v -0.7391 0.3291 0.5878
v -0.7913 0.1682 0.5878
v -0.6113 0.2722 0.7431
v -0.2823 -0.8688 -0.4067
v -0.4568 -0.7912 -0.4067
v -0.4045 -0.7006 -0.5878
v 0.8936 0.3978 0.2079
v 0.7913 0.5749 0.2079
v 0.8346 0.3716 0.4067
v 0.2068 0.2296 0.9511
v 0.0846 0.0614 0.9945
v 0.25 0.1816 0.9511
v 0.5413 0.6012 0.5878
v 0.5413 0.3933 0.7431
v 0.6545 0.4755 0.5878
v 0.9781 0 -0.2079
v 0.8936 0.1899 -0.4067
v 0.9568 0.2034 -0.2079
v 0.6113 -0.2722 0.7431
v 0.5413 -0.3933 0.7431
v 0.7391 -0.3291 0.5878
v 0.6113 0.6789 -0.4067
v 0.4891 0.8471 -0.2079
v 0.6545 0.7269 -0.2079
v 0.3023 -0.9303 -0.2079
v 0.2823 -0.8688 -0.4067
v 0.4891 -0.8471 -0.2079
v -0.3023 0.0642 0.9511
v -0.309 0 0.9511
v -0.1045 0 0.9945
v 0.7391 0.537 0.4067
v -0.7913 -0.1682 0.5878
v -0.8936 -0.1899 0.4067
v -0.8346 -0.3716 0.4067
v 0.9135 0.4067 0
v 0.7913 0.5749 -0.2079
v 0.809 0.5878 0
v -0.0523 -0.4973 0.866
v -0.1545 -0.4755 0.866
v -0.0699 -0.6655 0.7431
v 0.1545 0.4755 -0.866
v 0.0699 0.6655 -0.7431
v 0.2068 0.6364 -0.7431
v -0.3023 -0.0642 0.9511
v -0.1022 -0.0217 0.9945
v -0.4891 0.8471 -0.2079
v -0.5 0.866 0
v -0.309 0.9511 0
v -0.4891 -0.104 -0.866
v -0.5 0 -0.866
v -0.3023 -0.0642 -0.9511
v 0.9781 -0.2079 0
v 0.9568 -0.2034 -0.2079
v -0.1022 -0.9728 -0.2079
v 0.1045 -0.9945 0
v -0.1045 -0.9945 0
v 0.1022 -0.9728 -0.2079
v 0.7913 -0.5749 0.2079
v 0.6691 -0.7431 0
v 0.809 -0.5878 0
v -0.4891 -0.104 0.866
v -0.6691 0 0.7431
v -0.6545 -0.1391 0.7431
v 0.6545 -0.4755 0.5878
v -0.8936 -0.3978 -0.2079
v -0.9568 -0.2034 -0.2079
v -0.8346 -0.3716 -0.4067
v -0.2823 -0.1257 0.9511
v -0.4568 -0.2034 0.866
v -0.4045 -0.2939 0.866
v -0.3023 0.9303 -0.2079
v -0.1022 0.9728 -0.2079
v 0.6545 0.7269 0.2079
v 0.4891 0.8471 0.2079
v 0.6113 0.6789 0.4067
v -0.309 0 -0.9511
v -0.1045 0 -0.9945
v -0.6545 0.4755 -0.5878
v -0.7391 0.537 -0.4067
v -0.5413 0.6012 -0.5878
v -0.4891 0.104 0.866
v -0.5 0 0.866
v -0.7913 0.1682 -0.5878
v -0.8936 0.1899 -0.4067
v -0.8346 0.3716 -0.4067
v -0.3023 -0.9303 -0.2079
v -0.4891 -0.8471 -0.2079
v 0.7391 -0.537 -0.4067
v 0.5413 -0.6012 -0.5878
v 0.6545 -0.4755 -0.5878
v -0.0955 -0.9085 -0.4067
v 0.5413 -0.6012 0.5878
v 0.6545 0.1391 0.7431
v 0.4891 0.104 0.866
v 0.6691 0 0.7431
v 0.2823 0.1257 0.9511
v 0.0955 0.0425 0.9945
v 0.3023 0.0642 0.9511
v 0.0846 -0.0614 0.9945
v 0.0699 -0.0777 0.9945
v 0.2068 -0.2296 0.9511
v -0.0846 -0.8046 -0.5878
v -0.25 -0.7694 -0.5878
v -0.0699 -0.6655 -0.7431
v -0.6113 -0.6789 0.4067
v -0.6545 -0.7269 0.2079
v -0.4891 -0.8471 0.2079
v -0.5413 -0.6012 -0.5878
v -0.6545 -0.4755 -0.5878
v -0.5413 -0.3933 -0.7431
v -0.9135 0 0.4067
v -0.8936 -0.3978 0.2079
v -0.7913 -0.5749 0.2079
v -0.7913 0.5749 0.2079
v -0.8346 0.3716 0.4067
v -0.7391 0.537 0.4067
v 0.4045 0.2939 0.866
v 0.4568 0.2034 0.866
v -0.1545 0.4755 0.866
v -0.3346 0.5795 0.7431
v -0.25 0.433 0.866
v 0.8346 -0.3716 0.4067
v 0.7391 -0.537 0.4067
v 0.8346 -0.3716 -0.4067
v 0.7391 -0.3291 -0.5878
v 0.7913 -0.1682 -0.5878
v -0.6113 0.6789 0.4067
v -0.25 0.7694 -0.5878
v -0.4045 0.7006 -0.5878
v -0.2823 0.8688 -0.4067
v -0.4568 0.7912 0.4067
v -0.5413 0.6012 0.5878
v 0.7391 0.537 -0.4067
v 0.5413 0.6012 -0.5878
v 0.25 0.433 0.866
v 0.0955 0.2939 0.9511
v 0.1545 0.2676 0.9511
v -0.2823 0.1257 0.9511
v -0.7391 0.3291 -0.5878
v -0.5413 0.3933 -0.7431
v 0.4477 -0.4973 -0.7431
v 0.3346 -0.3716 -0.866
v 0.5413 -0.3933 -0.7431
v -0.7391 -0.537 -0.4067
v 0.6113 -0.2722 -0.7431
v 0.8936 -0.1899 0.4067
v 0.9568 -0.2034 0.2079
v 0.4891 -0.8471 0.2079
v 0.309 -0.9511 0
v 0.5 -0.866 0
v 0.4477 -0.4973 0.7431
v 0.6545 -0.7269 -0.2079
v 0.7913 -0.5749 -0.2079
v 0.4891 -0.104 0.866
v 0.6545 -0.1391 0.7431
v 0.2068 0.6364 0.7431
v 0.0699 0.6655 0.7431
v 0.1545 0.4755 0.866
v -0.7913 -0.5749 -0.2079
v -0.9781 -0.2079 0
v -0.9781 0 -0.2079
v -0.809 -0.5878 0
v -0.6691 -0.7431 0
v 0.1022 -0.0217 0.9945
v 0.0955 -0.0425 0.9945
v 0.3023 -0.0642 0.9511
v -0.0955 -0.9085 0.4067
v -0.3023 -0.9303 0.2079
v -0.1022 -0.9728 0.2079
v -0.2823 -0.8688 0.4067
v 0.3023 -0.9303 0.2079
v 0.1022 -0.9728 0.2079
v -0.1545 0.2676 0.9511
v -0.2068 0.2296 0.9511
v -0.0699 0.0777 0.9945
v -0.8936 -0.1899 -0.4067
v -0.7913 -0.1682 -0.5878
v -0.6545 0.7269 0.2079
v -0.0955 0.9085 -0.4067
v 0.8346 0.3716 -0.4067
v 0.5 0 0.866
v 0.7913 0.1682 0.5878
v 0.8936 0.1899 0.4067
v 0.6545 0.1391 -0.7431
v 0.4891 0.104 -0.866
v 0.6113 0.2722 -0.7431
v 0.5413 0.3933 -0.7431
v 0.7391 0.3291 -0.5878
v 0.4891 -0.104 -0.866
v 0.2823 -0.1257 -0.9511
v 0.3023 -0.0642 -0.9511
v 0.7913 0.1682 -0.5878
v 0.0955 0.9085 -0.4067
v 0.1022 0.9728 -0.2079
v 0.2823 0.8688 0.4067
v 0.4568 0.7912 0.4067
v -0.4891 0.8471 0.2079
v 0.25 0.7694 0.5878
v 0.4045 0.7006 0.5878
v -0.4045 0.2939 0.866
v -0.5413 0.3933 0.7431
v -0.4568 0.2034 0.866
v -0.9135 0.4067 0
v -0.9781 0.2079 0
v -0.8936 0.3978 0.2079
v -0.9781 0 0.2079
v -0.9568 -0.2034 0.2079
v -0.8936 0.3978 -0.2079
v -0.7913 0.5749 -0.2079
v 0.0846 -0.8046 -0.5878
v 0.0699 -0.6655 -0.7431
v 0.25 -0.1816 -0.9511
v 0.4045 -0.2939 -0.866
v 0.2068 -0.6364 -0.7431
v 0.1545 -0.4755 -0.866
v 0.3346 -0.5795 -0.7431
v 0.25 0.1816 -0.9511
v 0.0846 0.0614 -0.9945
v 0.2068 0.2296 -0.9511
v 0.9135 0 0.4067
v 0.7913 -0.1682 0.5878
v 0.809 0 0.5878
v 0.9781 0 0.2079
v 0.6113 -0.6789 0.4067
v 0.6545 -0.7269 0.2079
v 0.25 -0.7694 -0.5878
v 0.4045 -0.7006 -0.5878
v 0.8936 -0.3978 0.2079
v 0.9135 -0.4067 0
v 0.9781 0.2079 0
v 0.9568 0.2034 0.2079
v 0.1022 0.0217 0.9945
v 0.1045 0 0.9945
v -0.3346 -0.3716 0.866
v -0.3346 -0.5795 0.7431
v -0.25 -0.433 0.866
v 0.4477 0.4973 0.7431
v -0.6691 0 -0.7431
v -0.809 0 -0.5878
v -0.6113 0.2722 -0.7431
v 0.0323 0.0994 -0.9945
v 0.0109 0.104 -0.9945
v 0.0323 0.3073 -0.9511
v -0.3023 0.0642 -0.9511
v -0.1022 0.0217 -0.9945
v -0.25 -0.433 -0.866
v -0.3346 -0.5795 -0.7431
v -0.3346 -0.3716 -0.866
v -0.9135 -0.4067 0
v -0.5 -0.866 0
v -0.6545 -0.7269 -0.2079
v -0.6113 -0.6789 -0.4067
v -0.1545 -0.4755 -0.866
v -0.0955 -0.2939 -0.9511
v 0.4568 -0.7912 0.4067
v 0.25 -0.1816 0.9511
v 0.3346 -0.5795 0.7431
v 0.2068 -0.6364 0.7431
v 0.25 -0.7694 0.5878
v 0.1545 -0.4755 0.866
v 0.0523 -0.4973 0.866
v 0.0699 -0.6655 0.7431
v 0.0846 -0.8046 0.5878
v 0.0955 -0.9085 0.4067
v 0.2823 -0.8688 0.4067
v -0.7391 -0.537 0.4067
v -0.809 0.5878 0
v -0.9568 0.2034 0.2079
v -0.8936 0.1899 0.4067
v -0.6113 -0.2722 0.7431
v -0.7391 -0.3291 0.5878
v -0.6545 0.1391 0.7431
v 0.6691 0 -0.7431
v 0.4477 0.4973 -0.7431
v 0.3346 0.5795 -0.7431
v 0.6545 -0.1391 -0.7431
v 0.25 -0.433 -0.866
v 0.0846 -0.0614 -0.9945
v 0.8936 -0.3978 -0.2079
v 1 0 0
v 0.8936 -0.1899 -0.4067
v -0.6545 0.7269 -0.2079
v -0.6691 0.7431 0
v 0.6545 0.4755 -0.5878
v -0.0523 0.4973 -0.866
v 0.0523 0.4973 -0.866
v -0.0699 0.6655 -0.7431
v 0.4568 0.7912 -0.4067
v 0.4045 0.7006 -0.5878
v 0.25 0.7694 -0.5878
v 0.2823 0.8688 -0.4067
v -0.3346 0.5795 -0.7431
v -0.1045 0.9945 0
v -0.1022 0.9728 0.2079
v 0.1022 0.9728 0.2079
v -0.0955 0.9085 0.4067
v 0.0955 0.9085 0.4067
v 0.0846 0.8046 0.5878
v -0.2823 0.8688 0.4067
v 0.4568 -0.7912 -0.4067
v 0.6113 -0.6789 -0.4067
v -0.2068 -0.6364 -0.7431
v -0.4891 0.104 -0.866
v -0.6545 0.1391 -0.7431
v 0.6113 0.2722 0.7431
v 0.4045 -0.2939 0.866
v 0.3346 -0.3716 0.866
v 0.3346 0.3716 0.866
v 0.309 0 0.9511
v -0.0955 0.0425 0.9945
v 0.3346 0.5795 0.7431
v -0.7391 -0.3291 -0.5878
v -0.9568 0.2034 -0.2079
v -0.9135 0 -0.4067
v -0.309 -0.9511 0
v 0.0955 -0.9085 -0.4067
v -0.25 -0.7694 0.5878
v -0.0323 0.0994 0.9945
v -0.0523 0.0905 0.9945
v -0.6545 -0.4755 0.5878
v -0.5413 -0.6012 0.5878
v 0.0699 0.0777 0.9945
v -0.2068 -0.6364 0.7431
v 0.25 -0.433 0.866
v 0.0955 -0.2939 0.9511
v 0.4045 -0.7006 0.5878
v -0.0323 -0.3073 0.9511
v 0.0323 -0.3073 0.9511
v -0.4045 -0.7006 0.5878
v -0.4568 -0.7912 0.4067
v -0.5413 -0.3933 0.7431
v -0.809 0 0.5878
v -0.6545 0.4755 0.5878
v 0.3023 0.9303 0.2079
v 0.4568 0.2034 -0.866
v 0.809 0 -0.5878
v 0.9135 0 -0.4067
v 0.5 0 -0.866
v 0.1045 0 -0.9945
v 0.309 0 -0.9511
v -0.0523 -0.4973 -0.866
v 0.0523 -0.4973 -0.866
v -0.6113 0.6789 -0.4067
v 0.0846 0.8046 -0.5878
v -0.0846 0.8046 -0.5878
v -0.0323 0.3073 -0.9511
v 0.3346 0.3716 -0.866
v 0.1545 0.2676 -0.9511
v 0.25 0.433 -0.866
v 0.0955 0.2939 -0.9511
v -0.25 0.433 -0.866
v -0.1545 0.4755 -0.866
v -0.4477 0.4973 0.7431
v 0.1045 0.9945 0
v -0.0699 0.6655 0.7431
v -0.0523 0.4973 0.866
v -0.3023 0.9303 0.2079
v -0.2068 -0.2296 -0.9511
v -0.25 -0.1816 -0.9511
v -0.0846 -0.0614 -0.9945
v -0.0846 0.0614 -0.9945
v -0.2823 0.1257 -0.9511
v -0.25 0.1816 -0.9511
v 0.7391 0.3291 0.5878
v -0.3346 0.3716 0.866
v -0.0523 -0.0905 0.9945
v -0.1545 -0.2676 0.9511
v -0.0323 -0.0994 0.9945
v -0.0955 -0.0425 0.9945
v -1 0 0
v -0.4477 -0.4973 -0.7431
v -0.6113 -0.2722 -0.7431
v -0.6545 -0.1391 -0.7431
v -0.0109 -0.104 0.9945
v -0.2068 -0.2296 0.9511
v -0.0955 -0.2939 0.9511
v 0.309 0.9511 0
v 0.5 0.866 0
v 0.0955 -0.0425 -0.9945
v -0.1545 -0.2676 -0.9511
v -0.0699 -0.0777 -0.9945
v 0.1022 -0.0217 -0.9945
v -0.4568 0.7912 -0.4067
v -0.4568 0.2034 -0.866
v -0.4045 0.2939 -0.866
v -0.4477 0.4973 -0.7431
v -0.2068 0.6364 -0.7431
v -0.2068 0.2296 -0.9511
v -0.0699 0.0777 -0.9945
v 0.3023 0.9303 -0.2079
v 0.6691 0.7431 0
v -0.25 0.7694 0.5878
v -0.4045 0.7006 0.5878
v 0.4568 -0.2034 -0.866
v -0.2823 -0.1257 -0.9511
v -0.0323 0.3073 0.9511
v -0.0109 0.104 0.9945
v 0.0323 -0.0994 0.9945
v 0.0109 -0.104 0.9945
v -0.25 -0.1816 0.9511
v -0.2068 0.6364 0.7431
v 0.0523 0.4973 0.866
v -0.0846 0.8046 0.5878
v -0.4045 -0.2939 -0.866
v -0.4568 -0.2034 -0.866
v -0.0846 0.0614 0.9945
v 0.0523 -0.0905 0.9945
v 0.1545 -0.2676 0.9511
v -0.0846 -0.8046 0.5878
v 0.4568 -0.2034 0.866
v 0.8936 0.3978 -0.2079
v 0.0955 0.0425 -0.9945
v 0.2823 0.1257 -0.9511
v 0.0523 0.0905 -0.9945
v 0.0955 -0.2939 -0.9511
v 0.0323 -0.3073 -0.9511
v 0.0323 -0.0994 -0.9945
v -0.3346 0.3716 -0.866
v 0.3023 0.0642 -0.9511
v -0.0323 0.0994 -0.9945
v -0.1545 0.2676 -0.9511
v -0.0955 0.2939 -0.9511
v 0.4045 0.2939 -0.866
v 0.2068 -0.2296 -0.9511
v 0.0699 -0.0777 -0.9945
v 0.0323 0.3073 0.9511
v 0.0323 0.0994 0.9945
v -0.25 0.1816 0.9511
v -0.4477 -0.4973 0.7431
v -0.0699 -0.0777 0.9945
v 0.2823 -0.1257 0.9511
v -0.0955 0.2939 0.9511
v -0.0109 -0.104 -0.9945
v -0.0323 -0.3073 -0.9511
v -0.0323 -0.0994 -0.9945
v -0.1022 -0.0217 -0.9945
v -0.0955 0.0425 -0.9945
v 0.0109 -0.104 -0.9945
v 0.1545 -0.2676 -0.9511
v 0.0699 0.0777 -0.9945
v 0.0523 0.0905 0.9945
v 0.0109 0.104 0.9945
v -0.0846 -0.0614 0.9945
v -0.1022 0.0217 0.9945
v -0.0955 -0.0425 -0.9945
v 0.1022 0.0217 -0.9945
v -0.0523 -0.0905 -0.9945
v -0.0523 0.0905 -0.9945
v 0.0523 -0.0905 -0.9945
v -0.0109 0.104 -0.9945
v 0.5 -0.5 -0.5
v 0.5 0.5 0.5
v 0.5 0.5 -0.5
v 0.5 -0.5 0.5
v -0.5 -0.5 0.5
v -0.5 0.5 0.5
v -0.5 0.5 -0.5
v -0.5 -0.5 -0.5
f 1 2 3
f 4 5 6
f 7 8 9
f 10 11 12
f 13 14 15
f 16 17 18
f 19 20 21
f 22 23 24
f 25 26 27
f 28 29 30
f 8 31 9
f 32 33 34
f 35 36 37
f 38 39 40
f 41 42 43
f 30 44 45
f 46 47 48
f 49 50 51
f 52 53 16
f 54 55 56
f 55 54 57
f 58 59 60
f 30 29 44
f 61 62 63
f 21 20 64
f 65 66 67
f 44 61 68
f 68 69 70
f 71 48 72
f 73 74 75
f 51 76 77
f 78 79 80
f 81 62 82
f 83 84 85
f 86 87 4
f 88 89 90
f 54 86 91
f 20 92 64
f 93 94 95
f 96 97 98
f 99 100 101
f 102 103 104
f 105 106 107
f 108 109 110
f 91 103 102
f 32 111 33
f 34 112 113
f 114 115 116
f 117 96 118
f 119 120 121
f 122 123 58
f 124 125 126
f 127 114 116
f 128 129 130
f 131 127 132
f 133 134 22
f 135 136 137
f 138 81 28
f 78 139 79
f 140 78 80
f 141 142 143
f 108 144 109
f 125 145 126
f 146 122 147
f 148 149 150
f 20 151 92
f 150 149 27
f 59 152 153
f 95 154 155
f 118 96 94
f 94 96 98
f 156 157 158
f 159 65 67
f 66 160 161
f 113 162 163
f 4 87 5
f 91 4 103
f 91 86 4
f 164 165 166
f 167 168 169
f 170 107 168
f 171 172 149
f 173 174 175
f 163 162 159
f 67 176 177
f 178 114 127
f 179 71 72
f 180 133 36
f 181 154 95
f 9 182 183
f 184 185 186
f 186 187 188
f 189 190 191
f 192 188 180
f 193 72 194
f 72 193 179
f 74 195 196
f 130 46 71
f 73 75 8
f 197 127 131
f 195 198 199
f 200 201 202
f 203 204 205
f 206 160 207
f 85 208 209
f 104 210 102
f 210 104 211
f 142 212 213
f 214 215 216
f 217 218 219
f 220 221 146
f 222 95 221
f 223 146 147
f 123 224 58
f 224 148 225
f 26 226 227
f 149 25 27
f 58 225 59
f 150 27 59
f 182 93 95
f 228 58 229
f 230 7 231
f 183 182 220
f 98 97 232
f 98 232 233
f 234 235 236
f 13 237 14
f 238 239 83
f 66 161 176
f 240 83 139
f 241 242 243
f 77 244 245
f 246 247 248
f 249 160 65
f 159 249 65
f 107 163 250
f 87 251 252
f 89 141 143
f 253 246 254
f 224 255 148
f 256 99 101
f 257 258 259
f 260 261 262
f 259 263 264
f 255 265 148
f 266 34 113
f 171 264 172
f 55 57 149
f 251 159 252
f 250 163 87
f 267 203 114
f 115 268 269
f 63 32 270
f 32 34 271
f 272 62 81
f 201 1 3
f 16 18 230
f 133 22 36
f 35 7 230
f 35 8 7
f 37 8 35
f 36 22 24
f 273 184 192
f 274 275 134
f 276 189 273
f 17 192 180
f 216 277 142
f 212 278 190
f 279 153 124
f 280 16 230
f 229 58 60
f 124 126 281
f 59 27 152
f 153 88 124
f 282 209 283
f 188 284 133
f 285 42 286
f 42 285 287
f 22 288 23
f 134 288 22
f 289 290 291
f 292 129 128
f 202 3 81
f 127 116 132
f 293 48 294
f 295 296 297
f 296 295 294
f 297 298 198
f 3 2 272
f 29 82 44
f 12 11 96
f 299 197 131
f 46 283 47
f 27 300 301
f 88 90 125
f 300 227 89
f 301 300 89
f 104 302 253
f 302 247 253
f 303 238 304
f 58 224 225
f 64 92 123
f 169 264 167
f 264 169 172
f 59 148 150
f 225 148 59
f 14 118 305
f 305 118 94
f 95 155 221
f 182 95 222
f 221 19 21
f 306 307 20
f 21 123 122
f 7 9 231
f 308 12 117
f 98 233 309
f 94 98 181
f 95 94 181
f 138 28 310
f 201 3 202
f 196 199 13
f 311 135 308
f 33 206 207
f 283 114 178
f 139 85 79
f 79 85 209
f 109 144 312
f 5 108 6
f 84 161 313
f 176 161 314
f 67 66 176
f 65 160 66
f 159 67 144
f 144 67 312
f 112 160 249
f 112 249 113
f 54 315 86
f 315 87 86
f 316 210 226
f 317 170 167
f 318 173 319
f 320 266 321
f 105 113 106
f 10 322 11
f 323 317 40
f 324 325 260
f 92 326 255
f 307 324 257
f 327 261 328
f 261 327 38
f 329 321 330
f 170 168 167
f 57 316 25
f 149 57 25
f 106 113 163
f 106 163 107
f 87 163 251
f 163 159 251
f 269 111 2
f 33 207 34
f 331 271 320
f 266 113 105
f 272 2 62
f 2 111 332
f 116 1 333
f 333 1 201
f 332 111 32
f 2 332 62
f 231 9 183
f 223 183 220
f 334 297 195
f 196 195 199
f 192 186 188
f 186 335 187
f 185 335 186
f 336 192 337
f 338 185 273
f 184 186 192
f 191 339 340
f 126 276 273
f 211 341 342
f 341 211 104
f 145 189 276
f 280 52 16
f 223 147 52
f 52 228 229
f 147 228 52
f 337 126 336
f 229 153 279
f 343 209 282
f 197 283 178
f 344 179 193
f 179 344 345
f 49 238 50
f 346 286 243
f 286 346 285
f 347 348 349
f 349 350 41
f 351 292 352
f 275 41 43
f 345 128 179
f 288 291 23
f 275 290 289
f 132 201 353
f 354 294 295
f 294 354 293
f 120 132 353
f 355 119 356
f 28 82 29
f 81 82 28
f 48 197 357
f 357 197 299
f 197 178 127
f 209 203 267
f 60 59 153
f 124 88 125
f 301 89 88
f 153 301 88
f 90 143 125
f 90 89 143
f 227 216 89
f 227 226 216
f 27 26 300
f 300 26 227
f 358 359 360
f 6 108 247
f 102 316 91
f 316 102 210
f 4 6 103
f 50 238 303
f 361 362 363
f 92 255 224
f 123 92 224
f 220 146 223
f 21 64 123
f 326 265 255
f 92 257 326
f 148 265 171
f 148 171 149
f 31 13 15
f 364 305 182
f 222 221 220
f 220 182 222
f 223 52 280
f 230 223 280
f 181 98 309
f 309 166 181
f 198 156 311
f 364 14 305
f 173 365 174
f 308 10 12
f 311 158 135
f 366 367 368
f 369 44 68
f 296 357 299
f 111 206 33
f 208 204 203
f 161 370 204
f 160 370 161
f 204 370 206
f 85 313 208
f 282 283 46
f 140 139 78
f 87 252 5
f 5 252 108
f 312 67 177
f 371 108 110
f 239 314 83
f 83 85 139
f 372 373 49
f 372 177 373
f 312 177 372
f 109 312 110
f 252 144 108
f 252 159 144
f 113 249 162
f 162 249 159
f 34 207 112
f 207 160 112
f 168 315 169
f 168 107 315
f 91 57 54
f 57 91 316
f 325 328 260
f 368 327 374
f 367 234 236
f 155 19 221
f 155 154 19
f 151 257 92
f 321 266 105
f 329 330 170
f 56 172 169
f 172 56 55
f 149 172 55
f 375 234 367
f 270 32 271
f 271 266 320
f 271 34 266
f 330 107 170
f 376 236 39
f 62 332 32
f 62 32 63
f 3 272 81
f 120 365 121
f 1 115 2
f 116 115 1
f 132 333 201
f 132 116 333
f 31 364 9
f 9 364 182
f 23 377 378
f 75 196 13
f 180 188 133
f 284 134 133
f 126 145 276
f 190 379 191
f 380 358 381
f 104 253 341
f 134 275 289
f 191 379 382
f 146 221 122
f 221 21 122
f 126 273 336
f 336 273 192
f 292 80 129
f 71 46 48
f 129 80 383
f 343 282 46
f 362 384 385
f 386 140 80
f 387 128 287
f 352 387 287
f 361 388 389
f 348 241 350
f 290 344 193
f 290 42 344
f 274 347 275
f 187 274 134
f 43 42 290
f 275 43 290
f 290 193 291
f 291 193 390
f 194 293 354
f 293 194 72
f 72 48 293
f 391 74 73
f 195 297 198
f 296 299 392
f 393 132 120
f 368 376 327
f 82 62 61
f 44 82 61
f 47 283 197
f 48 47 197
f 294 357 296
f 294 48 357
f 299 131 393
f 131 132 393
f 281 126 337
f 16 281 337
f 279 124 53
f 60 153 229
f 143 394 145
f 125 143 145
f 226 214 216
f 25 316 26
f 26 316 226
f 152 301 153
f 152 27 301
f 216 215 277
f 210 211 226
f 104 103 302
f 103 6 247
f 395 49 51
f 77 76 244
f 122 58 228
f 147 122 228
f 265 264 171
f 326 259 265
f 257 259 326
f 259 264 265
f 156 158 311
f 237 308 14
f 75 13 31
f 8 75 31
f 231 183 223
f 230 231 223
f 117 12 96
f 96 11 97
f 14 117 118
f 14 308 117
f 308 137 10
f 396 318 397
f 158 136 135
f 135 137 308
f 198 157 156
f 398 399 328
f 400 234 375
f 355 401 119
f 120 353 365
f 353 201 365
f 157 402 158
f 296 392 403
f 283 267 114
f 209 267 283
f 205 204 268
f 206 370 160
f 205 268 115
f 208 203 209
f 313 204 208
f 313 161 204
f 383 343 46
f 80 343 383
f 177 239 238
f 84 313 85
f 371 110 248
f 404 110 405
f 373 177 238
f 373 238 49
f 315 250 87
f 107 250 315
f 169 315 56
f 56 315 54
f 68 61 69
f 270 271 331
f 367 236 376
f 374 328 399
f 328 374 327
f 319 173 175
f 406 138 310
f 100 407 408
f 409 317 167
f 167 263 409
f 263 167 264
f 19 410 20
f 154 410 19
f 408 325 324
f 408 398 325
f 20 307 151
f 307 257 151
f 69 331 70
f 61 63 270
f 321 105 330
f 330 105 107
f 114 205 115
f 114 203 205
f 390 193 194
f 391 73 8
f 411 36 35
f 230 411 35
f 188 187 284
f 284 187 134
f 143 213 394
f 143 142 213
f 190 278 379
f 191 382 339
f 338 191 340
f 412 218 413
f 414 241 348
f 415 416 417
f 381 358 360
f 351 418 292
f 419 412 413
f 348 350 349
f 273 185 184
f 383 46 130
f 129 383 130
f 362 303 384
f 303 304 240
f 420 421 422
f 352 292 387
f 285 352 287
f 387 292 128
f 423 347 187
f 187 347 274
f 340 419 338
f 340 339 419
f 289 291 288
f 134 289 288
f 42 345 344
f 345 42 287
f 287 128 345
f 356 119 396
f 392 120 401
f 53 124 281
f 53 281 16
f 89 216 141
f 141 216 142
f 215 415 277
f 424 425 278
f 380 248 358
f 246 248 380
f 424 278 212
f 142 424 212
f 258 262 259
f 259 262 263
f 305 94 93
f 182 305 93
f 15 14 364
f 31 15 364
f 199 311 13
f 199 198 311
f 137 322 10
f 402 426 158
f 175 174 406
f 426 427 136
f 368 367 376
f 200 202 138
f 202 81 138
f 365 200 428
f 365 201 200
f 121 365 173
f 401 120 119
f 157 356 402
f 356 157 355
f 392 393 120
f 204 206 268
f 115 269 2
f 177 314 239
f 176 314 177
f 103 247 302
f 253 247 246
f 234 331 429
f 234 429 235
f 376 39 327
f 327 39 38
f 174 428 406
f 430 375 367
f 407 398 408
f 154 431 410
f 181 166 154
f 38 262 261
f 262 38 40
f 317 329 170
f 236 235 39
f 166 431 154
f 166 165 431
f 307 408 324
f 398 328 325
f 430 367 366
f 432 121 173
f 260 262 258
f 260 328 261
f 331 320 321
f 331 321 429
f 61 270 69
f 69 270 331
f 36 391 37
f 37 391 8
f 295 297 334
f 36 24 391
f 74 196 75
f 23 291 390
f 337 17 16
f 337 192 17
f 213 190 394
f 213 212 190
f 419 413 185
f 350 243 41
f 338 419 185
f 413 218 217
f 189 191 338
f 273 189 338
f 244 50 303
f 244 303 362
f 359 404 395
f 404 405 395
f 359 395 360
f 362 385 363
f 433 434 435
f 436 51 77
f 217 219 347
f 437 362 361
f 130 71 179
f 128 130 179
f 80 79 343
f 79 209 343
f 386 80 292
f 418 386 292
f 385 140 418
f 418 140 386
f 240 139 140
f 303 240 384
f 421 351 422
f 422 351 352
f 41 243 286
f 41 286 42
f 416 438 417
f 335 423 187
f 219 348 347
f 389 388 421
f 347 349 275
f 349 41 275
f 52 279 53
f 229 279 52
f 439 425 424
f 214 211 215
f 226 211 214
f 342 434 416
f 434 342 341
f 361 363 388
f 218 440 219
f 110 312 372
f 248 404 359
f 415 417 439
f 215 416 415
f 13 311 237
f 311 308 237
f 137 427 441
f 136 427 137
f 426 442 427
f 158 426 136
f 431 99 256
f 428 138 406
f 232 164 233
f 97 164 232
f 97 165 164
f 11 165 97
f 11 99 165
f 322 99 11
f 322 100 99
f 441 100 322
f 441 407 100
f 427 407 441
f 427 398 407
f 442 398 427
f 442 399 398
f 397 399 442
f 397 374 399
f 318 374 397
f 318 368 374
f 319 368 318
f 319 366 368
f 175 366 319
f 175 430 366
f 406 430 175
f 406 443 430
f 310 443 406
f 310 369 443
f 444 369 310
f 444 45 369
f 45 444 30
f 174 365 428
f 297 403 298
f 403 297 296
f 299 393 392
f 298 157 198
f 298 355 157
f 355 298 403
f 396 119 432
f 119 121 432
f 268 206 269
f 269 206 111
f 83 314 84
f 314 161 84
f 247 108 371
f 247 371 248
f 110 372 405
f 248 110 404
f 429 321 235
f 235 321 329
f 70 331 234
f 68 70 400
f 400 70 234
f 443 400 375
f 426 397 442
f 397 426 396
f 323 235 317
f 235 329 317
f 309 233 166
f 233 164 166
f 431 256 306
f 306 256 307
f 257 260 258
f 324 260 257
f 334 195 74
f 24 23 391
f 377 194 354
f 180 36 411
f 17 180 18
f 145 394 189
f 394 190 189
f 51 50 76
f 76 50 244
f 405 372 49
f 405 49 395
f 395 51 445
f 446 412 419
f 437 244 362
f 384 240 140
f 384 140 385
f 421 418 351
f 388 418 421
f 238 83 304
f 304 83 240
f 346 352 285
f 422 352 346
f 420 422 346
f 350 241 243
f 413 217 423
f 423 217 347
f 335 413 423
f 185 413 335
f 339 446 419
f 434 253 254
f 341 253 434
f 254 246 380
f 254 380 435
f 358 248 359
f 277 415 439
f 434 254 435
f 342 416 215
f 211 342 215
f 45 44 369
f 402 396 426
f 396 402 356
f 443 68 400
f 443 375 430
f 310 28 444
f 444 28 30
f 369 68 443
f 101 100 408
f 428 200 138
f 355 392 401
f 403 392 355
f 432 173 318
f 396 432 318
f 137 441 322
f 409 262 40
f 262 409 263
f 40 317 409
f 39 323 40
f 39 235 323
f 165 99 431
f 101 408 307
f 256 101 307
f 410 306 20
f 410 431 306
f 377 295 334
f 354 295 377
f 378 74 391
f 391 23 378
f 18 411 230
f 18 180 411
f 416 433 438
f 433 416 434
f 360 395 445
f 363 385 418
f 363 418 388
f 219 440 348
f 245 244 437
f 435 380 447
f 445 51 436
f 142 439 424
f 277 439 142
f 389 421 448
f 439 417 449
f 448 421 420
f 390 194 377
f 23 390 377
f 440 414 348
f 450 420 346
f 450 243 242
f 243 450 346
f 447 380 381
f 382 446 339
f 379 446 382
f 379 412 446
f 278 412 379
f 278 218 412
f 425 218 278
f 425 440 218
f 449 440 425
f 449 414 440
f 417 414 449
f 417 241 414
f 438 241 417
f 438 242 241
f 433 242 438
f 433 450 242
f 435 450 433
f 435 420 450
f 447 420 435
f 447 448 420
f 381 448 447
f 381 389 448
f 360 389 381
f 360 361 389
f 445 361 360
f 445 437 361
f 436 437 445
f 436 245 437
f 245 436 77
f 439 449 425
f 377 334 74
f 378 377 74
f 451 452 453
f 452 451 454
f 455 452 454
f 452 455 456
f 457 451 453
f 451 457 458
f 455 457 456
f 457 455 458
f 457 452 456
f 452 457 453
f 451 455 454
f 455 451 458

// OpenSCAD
$fn = 30;

difference() {
	sphere(d=2, center=true);
	cube(d=8, center=true);
}
